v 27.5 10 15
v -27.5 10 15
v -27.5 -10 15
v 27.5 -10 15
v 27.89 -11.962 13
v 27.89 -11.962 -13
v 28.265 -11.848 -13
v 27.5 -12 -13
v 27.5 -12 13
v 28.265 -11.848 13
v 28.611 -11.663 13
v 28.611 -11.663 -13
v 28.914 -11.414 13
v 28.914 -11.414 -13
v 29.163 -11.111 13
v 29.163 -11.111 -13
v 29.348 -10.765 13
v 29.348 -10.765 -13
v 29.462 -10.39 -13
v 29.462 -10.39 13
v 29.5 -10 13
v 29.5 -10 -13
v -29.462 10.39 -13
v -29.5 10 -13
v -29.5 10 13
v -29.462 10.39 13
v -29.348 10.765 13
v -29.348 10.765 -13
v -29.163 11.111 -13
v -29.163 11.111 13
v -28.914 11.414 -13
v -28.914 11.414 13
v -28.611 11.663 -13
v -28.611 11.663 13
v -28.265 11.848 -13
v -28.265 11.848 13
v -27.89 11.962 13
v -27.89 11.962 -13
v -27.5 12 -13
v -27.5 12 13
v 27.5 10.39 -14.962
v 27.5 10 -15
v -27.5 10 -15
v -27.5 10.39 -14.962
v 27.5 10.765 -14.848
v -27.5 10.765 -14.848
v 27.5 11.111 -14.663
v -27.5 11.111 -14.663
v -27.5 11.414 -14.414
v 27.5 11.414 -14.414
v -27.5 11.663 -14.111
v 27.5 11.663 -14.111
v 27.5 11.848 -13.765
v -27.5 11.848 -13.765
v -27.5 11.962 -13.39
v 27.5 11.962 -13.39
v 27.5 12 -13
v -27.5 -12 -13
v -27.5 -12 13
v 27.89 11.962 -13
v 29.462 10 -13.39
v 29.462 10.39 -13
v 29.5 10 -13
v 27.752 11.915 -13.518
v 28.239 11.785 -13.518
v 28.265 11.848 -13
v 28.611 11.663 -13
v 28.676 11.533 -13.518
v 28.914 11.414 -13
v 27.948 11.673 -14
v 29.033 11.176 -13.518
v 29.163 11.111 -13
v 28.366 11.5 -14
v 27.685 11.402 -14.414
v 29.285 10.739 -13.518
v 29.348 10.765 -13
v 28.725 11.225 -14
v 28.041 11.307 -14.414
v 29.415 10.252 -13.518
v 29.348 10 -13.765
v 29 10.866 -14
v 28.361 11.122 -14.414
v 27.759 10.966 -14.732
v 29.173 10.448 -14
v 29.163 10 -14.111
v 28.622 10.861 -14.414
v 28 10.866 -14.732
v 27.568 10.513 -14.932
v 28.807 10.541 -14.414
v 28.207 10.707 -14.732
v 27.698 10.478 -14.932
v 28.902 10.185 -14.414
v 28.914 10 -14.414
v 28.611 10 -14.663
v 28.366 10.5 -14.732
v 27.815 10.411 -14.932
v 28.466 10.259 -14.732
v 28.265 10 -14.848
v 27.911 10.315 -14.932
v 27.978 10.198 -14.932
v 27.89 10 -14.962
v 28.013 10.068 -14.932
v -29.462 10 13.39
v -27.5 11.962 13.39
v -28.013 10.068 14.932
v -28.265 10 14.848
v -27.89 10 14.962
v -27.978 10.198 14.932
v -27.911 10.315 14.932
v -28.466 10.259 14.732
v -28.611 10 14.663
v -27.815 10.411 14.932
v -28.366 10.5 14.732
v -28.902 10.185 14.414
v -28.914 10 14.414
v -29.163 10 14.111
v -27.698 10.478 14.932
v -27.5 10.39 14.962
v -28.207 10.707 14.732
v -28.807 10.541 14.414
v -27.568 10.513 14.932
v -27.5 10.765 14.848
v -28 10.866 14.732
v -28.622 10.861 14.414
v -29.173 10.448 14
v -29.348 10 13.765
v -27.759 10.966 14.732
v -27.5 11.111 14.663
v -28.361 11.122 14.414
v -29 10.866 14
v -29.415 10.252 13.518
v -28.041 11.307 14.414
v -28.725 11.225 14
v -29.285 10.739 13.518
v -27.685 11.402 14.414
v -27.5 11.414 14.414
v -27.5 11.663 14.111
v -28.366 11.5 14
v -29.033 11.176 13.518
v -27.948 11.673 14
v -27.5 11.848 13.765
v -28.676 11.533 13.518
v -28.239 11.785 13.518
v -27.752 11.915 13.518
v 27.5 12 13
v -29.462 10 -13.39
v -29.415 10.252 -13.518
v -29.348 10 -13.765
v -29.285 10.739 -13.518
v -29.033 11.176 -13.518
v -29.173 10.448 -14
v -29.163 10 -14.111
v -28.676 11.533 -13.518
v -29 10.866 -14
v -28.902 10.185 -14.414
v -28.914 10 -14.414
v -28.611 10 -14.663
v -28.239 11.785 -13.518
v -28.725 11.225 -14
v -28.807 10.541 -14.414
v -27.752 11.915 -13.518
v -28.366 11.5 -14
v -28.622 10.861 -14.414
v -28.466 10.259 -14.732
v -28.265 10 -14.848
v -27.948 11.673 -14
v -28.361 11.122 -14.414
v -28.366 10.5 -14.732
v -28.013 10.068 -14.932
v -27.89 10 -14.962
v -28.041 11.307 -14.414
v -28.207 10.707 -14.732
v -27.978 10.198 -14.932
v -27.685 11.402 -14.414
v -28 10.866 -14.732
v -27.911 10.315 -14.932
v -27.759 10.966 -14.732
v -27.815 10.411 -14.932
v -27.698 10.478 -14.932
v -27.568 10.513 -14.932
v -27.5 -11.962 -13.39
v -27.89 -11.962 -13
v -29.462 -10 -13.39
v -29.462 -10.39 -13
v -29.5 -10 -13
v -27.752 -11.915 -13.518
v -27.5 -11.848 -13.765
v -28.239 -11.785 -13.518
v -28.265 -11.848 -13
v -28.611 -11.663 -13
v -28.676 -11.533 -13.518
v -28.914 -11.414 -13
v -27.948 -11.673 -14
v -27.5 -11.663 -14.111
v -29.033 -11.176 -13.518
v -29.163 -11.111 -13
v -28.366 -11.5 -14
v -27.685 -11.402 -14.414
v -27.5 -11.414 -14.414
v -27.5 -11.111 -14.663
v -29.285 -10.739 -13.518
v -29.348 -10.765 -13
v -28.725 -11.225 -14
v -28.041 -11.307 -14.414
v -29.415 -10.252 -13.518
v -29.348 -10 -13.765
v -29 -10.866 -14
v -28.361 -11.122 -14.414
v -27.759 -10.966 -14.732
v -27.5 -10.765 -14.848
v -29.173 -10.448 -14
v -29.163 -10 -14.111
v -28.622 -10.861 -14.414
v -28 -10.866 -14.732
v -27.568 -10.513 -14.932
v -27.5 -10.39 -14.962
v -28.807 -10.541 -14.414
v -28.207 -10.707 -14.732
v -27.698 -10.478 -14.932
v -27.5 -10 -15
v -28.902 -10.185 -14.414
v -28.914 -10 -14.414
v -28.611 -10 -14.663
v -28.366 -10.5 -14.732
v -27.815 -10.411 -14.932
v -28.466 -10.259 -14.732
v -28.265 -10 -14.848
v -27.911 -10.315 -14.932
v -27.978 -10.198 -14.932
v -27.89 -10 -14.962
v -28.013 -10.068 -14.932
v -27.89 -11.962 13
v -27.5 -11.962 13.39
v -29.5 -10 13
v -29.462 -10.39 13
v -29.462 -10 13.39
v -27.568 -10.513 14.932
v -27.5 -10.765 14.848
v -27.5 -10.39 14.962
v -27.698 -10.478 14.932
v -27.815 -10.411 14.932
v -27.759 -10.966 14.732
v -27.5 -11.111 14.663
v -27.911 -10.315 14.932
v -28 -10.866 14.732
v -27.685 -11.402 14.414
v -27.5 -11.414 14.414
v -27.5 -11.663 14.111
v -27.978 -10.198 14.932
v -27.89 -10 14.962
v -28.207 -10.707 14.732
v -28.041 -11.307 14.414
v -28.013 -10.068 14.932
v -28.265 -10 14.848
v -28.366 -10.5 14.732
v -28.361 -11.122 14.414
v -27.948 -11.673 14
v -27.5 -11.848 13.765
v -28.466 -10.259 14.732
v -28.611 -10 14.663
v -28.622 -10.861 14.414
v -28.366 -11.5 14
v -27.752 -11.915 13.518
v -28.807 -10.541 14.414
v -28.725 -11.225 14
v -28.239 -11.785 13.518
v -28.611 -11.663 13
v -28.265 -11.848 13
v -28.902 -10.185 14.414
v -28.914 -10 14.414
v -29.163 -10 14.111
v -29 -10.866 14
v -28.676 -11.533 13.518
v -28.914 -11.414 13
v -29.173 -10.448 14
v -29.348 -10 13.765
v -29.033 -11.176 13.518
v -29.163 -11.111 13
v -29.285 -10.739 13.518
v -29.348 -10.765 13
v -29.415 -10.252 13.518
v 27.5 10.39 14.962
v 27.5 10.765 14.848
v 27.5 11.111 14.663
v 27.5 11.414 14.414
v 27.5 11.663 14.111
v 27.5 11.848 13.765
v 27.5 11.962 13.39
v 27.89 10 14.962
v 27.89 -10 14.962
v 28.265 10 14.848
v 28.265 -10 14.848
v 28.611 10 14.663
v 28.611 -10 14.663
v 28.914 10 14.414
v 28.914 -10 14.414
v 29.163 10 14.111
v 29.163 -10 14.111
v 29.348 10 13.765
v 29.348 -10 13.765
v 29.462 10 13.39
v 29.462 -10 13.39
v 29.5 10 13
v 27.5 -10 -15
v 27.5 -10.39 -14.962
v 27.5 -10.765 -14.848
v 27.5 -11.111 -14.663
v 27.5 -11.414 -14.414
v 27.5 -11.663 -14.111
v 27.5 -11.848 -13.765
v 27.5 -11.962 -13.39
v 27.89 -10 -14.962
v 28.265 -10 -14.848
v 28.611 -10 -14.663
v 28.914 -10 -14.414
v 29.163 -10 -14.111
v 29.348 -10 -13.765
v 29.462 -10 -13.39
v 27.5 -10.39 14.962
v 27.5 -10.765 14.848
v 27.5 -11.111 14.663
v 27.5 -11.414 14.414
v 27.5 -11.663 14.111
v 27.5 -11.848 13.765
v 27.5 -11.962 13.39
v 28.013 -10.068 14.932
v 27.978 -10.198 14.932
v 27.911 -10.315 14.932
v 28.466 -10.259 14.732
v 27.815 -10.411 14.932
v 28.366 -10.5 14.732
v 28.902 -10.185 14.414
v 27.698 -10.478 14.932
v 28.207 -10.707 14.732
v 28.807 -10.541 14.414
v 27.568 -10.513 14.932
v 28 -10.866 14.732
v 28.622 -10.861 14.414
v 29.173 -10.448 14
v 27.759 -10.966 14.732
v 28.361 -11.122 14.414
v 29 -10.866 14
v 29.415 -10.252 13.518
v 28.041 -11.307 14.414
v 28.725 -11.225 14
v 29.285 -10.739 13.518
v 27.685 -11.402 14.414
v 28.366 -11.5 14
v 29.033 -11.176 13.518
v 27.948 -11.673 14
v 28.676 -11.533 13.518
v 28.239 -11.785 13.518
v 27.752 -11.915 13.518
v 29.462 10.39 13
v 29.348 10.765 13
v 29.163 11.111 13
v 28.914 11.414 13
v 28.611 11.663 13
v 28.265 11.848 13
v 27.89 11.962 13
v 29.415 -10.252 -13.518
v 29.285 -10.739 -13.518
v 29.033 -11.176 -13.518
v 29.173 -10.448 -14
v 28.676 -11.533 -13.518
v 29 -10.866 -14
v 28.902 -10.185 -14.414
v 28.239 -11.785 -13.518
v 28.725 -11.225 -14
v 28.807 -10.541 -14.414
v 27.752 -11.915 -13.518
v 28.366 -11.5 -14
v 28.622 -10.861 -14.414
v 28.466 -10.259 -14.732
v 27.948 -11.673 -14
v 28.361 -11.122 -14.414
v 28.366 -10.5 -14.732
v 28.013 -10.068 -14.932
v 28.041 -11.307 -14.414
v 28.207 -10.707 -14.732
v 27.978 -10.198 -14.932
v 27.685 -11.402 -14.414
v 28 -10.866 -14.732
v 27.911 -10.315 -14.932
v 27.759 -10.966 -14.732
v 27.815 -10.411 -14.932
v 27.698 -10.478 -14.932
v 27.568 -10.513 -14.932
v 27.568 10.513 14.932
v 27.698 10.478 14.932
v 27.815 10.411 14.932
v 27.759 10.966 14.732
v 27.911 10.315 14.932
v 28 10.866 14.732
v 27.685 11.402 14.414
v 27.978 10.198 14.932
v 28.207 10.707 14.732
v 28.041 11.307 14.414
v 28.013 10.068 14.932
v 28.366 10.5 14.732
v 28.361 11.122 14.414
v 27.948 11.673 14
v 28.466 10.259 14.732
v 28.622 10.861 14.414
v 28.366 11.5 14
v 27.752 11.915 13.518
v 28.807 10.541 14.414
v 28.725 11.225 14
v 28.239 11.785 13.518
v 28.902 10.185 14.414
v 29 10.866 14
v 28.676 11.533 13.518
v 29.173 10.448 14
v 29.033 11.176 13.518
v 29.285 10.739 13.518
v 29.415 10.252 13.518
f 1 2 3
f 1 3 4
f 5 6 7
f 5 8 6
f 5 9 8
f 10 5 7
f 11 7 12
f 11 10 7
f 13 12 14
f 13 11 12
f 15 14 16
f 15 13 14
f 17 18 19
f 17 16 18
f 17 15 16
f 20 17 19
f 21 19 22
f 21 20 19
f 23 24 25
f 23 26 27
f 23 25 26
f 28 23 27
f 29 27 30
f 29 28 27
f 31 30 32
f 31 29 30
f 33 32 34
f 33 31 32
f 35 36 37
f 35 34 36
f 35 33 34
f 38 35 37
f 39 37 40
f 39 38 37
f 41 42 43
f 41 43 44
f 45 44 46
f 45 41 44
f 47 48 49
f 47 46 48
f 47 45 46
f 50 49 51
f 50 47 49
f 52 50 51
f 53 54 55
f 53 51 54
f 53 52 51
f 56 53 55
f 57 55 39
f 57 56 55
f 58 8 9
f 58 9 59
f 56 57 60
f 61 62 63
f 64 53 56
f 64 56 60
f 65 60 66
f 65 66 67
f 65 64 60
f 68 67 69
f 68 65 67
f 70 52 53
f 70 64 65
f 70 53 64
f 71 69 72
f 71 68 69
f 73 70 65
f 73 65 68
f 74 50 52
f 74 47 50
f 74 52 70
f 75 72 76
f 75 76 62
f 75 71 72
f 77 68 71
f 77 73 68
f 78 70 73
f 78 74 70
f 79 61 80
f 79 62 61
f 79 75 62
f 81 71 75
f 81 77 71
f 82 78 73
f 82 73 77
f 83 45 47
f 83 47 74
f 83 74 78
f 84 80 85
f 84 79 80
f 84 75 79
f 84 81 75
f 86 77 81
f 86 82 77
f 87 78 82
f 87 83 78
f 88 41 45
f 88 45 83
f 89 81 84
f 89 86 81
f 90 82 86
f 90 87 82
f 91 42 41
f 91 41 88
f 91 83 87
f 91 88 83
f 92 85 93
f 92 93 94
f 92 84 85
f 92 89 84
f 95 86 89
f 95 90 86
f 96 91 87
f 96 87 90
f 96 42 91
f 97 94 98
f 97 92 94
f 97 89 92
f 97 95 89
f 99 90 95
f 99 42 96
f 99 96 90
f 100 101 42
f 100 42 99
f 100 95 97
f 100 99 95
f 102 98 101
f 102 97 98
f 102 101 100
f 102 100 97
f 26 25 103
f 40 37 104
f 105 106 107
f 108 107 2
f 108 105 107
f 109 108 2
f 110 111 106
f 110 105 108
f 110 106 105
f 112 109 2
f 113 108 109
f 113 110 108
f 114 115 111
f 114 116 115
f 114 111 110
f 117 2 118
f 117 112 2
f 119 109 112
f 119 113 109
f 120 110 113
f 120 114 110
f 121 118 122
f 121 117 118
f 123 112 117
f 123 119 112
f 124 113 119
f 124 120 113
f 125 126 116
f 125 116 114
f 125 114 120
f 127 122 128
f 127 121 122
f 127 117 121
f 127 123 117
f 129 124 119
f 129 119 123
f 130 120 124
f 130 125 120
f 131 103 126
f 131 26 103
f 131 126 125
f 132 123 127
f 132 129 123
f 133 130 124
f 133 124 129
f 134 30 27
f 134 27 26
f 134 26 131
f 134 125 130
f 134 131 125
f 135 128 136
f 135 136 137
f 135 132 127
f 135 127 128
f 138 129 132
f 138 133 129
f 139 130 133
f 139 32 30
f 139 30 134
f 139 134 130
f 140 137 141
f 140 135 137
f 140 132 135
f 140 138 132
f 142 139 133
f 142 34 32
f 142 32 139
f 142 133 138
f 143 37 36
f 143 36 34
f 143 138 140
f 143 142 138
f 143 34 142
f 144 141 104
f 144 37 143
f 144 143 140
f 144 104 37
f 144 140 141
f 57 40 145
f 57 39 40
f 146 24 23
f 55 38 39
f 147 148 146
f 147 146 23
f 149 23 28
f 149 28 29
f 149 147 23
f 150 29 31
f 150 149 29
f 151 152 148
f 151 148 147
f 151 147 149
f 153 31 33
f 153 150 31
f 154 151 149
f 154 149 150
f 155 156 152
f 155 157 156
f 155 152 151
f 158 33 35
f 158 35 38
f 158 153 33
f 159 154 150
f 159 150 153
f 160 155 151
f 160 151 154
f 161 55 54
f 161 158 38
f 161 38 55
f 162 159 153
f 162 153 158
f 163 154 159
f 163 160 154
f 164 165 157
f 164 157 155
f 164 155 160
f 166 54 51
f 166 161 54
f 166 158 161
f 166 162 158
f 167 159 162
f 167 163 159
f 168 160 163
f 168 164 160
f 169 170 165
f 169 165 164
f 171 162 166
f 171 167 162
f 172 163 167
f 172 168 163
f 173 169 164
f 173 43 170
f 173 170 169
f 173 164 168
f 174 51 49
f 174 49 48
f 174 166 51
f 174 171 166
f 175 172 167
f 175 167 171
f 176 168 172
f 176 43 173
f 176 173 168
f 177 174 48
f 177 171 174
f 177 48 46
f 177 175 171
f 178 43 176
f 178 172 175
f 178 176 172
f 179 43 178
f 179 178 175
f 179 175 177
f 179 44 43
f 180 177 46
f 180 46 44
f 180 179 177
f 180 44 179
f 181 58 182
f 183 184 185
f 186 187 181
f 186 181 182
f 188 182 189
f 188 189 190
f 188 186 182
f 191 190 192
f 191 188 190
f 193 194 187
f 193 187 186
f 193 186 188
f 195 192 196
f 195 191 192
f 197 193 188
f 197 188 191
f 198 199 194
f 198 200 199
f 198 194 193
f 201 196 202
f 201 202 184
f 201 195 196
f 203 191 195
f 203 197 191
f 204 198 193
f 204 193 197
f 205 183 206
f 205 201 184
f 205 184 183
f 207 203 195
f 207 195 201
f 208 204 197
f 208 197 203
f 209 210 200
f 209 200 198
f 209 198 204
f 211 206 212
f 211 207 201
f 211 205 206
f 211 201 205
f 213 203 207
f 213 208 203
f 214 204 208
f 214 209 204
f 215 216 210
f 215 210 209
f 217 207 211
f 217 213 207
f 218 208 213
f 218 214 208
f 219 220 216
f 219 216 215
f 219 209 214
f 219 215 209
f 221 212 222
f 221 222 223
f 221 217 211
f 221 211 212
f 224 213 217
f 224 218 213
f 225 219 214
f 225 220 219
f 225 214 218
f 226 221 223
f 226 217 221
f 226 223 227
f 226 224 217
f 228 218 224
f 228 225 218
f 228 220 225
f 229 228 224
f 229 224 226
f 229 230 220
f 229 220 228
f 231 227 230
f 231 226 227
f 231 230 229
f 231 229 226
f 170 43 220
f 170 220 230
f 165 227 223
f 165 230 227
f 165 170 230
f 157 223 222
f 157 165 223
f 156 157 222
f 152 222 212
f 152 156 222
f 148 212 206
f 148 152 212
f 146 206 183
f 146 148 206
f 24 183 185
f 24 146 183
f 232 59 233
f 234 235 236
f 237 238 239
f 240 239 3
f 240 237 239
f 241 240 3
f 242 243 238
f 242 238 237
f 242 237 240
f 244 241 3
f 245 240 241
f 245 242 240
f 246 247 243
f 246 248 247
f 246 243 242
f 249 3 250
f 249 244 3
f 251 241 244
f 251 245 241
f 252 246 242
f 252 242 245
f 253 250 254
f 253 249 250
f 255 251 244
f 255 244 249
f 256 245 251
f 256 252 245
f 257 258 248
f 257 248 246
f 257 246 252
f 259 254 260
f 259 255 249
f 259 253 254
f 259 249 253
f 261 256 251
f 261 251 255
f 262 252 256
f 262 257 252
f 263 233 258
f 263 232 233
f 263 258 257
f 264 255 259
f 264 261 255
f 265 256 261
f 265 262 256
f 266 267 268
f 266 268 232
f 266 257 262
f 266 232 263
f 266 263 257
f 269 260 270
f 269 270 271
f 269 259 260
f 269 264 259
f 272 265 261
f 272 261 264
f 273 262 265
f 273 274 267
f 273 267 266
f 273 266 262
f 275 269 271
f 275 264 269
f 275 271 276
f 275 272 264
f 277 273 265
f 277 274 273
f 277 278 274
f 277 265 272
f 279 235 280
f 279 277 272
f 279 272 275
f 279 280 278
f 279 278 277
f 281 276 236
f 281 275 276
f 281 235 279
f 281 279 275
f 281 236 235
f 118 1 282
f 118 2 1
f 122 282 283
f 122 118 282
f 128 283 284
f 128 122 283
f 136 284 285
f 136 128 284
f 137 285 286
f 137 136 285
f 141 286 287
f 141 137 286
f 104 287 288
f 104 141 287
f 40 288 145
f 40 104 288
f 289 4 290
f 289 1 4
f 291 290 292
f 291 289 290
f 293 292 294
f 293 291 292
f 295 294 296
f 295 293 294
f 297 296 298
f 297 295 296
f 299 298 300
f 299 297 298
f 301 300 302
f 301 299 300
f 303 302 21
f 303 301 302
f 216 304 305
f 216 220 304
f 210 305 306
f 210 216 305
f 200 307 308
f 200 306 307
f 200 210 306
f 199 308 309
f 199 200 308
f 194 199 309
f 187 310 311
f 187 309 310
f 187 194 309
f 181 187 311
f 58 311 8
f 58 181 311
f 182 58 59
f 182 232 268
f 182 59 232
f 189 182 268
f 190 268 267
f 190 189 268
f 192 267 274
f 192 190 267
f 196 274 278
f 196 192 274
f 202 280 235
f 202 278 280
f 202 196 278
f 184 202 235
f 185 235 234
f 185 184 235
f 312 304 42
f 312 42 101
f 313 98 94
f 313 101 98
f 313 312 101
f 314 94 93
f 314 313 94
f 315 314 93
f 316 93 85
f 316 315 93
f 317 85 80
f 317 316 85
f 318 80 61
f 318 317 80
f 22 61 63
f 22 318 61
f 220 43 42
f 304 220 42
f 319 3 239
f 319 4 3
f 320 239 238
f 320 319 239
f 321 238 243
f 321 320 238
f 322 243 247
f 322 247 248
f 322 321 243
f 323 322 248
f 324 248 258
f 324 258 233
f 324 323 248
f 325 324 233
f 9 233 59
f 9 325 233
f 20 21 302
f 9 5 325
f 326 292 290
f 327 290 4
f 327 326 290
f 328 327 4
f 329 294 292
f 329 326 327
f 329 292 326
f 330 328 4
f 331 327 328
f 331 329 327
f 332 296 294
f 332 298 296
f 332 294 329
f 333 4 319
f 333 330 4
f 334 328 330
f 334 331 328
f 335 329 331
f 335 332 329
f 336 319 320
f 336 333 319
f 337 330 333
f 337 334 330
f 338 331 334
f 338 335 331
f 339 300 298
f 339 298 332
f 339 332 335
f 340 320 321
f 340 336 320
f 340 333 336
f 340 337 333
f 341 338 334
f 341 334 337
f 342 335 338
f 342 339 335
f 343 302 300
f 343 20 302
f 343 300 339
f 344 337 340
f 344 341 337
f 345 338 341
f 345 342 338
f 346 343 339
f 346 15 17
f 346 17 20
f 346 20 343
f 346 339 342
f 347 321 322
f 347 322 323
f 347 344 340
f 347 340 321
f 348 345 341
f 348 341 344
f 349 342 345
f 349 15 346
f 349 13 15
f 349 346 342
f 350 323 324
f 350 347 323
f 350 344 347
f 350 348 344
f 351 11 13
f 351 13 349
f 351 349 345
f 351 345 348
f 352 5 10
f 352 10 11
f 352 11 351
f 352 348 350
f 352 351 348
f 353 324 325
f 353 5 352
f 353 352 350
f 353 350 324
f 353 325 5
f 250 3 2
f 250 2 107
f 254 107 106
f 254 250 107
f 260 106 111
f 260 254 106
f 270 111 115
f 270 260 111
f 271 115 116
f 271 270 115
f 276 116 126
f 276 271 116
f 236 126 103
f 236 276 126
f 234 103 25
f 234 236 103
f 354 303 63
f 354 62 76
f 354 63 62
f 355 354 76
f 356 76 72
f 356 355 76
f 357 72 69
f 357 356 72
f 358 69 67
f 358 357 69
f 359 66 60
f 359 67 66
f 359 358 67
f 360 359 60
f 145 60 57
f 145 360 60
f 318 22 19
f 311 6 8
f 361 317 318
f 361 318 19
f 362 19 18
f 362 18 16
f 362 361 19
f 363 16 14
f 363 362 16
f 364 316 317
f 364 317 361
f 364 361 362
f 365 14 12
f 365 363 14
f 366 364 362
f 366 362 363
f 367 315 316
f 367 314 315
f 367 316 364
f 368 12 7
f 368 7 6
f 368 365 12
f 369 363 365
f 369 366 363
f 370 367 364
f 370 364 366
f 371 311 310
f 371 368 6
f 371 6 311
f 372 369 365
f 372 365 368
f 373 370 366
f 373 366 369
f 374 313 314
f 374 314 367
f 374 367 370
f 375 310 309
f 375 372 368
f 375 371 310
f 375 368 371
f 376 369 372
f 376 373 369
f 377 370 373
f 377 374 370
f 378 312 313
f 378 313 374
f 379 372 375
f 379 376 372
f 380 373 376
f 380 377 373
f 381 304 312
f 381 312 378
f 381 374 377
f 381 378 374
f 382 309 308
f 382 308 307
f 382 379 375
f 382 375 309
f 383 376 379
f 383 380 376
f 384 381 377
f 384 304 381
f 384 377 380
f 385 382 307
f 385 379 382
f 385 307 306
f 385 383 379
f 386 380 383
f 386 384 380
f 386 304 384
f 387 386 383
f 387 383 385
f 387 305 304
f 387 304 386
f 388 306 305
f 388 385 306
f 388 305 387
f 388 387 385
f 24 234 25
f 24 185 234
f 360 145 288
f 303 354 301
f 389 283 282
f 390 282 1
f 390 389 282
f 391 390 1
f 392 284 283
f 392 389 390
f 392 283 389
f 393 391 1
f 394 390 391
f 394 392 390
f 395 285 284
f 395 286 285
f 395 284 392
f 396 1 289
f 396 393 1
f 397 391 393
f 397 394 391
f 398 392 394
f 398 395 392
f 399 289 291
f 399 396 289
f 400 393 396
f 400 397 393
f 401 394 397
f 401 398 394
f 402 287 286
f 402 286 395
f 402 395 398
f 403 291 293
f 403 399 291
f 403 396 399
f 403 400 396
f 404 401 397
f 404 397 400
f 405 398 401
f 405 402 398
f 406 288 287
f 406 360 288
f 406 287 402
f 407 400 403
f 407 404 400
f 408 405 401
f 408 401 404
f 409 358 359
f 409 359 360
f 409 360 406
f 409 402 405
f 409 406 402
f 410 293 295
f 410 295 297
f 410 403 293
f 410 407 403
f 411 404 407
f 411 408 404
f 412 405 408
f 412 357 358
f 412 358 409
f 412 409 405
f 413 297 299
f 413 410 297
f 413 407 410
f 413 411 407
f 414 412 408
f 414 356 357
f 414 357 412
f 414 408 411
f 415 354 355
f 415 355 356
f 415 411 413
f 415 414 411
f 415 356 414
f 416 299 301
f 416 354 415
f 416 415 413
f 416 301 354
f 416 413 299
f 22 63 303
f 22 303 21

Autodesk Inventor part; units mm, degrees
ref_plane "YZ Plane" through (0, 0, 0) normal (1, 0, 0) x (0, 1, 0)
ref_plane "XZ Plane" through (0, 0, 0) normal (0, 1, 0) x (-1, 0, 0)
ref_plane "XY Plane" through (0, 0, 0) normal (0, 0, 1) x (1, 0, 0)
sketch "Skizze1" plane through (0, 0, 0) normal (0, 0, 1) x (1, 0, 0)
  line L0 (29.5, -12) -> (-29.5, -12)
  line L1 (-29.5, -12) -> (-29.5, 12)
  line L2 (-29.5, 12) -> (29.5, 12)
  line L3 (29.5, 12) -> (29.5, -12)
  line L4 (29.5, -12) -> (-29.5, 12) construction
  line L5 (-29.5, -12) -> (29.5, 12) construction
  point P0 (0, 0)
  dimension "d0" = 59
  dimension "d1" = 24
extrude "Extrusion1" add sketch "Skizze1" along normal mid plane 30
fillet "Rundung1" radius 2 4 edges at (-29.5, -12, 0) (29.5, -12, 0) (-29.5, 12, 0) (29.5, 12, 0)
fillet "Rundung2" radius 2 16 edges at (28.9142, -11.4142, 15) (29.5, 0, 15) (28.9142, 11.4142, 15) (0, 12, 15) (-28.9142, 11.4142, 15) (-29.5, 0, 15) (-28.9142, -11.4142, 15) (0, -12, 15) (-28.9142, -11.4142, -15) (-29.5, 0, -15) (-28.9142, 11.4142, -15) (0, 12, -15) (28.9142, 11.4142, -15) (29.5, 0, -15) (28.9142, -11.4142, -15) (0, -12, -15)
properties part number "P_Akku_Dummy"
